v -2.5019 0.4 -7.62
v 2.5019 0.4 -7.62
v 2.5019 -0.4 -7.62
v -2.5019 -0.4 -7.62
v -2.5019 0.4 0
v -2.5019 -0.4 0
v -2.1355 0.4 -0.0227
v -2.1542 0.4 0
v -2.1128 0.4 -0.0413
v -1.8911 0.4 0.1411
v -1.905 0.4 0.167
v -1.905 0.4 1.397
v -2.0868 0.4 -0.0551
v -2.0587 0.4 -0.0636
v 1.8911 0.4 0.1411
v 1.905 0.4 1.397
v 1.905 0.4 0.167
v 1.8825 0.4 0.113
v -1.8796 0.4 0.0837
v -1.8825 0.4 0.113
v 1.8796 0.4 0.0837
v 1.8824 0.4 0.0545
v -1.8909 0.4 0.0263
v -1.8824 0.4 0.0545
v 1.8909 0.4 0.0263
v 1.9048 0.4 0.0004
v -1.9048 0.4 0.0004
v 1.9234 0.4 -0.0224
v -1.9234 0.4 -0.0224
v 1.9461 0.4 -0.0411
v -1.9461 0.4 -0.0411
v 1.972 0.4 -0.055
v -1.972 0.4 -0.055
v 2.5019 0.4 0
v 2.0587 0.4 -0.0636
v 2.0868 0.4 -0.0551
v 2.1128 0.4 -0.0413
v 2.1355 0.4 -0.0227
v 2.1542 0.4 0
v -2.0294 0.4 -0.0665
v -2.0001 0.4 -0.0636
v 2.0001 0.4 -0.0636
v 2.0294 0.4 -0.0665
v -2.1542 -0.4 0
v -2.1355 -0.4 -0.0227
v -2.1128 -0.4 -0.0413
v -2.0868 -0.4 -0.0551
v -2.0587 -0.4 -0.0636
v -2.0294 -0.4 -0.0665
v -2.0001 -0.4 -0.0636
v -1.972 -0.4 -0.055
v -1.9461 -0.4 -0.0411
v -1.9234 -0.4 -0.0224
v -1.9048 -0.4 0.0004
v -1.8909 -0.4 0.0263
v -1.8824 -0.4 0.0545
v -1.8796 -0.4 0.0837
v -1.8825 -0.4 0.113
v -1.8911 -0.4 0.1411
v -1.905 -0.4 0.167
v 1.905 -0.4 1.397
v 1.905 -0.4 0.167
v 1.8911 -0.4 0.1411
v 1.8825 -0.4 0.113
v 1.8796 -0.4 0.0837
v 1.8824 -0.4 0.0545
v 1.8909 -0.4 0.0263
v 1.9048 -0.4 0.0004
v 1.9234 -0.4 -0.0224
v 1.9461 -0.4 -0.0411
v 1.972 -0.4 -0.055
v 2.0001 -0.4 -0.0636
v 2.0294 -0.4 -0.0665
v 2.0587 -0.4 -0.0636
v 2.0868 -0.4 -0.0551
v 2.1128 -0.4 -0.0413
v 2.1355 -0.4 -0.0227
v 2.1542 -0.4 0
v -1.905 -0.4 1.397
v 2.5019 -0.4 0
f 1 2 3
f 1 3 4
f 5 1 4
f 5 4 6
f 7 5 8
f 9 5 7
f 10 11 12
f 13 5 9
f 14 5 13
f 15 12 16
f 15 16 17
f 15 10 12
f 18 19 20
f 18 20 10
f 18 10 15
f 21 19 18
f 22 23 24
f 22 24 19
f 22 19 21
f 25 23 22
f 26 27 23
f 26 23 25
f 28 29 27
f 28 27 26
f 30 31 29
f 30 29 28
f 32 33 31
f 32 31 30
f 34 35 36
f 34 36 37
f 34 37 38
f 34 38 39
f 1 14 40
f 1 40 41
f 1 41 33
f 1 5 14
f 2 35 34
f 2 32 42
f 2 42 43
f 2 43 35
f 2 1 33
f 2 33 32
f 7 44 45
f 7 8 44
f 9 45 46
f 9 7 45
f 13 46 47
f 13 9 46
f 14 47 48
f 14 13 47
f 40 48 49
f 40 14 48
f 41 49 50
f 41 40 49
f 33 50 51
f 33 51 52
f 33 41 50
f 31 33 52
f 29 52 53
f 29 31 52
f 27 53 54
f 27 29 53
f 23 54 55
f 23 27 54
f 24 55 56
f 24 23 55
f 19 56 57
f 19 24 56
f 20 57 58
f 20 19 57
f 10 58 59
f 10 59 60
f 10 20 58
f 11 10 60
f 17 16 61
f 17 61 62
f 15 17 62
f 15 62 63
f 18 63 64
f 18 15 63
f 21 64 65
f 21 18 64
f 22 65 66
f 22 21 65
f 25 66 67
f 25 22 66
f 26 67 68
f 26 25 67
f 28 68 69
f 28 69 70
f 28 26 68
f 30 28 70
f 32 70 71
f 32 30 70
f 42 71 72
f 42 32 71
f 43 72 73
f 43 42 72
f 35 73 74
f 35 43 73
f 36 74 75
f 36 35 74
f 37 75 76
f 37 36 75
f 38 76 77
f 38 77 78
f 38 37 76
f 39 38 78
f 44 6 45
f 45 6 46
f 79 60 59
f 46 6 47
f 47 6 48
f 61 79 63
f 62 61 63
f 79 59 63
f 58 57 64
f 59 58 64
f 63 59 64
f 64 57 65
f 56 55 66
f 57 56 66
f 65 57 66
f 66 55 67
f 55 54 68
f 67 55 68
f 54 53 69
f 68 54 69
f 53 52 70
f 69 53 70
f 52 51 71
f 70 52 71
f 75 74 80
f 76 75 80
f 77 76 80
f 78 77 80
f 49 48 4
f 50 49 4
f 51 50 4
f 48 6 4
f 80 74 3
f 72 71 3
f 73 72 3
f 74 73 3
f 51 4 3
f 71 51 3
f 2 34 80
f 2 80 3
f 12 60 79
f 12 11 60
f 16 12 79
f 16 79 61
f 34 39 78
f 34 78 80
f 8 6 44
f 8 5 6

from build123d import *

# Parameters (mm, degrees)
BOSS_EXTRUDE1_DEPTH = 0.4


with BuildPart() as part:
    # Sketch1 → Boss-Extrude1 (new, symmetric)
    with BuildSketch(Plane(origin=(0, 0, 0), x_dir=(1, 0, 0), z_dir=(0, 1, 0))):
        with BuildLine():
            Line((-1.905, -0.167031015), (-1.905, -1.397))
            Line((-1.905, -1.397), (1.905, -1.397))
            Line((1.905, -1.397), (1.905, -0.167031015))
            ThreePointArc((1.905, -0.167031015), (1.946084492, 0.041084492), (2.1542, 0))
            Line((2.1542, 0), (2.5019, 0))
            Line((2.5019, 0), (2.5019, 7.62))
            Line((2.5019, 7.62), (-2.5019, 7.62))
            Line((-2.5019, 7.62), (-2.5019, 0))
            Line((-2.5019, 0), (-2.1542, 0))
            ThreePointArc((-2.1542, 0), (-1.946084492, 0.041084492), (-1.905, -0.167031015))
        make_face()
    extrude(amount=BOSS_EXTRUDE1_DEPTH, both=True)


solid = part.part
